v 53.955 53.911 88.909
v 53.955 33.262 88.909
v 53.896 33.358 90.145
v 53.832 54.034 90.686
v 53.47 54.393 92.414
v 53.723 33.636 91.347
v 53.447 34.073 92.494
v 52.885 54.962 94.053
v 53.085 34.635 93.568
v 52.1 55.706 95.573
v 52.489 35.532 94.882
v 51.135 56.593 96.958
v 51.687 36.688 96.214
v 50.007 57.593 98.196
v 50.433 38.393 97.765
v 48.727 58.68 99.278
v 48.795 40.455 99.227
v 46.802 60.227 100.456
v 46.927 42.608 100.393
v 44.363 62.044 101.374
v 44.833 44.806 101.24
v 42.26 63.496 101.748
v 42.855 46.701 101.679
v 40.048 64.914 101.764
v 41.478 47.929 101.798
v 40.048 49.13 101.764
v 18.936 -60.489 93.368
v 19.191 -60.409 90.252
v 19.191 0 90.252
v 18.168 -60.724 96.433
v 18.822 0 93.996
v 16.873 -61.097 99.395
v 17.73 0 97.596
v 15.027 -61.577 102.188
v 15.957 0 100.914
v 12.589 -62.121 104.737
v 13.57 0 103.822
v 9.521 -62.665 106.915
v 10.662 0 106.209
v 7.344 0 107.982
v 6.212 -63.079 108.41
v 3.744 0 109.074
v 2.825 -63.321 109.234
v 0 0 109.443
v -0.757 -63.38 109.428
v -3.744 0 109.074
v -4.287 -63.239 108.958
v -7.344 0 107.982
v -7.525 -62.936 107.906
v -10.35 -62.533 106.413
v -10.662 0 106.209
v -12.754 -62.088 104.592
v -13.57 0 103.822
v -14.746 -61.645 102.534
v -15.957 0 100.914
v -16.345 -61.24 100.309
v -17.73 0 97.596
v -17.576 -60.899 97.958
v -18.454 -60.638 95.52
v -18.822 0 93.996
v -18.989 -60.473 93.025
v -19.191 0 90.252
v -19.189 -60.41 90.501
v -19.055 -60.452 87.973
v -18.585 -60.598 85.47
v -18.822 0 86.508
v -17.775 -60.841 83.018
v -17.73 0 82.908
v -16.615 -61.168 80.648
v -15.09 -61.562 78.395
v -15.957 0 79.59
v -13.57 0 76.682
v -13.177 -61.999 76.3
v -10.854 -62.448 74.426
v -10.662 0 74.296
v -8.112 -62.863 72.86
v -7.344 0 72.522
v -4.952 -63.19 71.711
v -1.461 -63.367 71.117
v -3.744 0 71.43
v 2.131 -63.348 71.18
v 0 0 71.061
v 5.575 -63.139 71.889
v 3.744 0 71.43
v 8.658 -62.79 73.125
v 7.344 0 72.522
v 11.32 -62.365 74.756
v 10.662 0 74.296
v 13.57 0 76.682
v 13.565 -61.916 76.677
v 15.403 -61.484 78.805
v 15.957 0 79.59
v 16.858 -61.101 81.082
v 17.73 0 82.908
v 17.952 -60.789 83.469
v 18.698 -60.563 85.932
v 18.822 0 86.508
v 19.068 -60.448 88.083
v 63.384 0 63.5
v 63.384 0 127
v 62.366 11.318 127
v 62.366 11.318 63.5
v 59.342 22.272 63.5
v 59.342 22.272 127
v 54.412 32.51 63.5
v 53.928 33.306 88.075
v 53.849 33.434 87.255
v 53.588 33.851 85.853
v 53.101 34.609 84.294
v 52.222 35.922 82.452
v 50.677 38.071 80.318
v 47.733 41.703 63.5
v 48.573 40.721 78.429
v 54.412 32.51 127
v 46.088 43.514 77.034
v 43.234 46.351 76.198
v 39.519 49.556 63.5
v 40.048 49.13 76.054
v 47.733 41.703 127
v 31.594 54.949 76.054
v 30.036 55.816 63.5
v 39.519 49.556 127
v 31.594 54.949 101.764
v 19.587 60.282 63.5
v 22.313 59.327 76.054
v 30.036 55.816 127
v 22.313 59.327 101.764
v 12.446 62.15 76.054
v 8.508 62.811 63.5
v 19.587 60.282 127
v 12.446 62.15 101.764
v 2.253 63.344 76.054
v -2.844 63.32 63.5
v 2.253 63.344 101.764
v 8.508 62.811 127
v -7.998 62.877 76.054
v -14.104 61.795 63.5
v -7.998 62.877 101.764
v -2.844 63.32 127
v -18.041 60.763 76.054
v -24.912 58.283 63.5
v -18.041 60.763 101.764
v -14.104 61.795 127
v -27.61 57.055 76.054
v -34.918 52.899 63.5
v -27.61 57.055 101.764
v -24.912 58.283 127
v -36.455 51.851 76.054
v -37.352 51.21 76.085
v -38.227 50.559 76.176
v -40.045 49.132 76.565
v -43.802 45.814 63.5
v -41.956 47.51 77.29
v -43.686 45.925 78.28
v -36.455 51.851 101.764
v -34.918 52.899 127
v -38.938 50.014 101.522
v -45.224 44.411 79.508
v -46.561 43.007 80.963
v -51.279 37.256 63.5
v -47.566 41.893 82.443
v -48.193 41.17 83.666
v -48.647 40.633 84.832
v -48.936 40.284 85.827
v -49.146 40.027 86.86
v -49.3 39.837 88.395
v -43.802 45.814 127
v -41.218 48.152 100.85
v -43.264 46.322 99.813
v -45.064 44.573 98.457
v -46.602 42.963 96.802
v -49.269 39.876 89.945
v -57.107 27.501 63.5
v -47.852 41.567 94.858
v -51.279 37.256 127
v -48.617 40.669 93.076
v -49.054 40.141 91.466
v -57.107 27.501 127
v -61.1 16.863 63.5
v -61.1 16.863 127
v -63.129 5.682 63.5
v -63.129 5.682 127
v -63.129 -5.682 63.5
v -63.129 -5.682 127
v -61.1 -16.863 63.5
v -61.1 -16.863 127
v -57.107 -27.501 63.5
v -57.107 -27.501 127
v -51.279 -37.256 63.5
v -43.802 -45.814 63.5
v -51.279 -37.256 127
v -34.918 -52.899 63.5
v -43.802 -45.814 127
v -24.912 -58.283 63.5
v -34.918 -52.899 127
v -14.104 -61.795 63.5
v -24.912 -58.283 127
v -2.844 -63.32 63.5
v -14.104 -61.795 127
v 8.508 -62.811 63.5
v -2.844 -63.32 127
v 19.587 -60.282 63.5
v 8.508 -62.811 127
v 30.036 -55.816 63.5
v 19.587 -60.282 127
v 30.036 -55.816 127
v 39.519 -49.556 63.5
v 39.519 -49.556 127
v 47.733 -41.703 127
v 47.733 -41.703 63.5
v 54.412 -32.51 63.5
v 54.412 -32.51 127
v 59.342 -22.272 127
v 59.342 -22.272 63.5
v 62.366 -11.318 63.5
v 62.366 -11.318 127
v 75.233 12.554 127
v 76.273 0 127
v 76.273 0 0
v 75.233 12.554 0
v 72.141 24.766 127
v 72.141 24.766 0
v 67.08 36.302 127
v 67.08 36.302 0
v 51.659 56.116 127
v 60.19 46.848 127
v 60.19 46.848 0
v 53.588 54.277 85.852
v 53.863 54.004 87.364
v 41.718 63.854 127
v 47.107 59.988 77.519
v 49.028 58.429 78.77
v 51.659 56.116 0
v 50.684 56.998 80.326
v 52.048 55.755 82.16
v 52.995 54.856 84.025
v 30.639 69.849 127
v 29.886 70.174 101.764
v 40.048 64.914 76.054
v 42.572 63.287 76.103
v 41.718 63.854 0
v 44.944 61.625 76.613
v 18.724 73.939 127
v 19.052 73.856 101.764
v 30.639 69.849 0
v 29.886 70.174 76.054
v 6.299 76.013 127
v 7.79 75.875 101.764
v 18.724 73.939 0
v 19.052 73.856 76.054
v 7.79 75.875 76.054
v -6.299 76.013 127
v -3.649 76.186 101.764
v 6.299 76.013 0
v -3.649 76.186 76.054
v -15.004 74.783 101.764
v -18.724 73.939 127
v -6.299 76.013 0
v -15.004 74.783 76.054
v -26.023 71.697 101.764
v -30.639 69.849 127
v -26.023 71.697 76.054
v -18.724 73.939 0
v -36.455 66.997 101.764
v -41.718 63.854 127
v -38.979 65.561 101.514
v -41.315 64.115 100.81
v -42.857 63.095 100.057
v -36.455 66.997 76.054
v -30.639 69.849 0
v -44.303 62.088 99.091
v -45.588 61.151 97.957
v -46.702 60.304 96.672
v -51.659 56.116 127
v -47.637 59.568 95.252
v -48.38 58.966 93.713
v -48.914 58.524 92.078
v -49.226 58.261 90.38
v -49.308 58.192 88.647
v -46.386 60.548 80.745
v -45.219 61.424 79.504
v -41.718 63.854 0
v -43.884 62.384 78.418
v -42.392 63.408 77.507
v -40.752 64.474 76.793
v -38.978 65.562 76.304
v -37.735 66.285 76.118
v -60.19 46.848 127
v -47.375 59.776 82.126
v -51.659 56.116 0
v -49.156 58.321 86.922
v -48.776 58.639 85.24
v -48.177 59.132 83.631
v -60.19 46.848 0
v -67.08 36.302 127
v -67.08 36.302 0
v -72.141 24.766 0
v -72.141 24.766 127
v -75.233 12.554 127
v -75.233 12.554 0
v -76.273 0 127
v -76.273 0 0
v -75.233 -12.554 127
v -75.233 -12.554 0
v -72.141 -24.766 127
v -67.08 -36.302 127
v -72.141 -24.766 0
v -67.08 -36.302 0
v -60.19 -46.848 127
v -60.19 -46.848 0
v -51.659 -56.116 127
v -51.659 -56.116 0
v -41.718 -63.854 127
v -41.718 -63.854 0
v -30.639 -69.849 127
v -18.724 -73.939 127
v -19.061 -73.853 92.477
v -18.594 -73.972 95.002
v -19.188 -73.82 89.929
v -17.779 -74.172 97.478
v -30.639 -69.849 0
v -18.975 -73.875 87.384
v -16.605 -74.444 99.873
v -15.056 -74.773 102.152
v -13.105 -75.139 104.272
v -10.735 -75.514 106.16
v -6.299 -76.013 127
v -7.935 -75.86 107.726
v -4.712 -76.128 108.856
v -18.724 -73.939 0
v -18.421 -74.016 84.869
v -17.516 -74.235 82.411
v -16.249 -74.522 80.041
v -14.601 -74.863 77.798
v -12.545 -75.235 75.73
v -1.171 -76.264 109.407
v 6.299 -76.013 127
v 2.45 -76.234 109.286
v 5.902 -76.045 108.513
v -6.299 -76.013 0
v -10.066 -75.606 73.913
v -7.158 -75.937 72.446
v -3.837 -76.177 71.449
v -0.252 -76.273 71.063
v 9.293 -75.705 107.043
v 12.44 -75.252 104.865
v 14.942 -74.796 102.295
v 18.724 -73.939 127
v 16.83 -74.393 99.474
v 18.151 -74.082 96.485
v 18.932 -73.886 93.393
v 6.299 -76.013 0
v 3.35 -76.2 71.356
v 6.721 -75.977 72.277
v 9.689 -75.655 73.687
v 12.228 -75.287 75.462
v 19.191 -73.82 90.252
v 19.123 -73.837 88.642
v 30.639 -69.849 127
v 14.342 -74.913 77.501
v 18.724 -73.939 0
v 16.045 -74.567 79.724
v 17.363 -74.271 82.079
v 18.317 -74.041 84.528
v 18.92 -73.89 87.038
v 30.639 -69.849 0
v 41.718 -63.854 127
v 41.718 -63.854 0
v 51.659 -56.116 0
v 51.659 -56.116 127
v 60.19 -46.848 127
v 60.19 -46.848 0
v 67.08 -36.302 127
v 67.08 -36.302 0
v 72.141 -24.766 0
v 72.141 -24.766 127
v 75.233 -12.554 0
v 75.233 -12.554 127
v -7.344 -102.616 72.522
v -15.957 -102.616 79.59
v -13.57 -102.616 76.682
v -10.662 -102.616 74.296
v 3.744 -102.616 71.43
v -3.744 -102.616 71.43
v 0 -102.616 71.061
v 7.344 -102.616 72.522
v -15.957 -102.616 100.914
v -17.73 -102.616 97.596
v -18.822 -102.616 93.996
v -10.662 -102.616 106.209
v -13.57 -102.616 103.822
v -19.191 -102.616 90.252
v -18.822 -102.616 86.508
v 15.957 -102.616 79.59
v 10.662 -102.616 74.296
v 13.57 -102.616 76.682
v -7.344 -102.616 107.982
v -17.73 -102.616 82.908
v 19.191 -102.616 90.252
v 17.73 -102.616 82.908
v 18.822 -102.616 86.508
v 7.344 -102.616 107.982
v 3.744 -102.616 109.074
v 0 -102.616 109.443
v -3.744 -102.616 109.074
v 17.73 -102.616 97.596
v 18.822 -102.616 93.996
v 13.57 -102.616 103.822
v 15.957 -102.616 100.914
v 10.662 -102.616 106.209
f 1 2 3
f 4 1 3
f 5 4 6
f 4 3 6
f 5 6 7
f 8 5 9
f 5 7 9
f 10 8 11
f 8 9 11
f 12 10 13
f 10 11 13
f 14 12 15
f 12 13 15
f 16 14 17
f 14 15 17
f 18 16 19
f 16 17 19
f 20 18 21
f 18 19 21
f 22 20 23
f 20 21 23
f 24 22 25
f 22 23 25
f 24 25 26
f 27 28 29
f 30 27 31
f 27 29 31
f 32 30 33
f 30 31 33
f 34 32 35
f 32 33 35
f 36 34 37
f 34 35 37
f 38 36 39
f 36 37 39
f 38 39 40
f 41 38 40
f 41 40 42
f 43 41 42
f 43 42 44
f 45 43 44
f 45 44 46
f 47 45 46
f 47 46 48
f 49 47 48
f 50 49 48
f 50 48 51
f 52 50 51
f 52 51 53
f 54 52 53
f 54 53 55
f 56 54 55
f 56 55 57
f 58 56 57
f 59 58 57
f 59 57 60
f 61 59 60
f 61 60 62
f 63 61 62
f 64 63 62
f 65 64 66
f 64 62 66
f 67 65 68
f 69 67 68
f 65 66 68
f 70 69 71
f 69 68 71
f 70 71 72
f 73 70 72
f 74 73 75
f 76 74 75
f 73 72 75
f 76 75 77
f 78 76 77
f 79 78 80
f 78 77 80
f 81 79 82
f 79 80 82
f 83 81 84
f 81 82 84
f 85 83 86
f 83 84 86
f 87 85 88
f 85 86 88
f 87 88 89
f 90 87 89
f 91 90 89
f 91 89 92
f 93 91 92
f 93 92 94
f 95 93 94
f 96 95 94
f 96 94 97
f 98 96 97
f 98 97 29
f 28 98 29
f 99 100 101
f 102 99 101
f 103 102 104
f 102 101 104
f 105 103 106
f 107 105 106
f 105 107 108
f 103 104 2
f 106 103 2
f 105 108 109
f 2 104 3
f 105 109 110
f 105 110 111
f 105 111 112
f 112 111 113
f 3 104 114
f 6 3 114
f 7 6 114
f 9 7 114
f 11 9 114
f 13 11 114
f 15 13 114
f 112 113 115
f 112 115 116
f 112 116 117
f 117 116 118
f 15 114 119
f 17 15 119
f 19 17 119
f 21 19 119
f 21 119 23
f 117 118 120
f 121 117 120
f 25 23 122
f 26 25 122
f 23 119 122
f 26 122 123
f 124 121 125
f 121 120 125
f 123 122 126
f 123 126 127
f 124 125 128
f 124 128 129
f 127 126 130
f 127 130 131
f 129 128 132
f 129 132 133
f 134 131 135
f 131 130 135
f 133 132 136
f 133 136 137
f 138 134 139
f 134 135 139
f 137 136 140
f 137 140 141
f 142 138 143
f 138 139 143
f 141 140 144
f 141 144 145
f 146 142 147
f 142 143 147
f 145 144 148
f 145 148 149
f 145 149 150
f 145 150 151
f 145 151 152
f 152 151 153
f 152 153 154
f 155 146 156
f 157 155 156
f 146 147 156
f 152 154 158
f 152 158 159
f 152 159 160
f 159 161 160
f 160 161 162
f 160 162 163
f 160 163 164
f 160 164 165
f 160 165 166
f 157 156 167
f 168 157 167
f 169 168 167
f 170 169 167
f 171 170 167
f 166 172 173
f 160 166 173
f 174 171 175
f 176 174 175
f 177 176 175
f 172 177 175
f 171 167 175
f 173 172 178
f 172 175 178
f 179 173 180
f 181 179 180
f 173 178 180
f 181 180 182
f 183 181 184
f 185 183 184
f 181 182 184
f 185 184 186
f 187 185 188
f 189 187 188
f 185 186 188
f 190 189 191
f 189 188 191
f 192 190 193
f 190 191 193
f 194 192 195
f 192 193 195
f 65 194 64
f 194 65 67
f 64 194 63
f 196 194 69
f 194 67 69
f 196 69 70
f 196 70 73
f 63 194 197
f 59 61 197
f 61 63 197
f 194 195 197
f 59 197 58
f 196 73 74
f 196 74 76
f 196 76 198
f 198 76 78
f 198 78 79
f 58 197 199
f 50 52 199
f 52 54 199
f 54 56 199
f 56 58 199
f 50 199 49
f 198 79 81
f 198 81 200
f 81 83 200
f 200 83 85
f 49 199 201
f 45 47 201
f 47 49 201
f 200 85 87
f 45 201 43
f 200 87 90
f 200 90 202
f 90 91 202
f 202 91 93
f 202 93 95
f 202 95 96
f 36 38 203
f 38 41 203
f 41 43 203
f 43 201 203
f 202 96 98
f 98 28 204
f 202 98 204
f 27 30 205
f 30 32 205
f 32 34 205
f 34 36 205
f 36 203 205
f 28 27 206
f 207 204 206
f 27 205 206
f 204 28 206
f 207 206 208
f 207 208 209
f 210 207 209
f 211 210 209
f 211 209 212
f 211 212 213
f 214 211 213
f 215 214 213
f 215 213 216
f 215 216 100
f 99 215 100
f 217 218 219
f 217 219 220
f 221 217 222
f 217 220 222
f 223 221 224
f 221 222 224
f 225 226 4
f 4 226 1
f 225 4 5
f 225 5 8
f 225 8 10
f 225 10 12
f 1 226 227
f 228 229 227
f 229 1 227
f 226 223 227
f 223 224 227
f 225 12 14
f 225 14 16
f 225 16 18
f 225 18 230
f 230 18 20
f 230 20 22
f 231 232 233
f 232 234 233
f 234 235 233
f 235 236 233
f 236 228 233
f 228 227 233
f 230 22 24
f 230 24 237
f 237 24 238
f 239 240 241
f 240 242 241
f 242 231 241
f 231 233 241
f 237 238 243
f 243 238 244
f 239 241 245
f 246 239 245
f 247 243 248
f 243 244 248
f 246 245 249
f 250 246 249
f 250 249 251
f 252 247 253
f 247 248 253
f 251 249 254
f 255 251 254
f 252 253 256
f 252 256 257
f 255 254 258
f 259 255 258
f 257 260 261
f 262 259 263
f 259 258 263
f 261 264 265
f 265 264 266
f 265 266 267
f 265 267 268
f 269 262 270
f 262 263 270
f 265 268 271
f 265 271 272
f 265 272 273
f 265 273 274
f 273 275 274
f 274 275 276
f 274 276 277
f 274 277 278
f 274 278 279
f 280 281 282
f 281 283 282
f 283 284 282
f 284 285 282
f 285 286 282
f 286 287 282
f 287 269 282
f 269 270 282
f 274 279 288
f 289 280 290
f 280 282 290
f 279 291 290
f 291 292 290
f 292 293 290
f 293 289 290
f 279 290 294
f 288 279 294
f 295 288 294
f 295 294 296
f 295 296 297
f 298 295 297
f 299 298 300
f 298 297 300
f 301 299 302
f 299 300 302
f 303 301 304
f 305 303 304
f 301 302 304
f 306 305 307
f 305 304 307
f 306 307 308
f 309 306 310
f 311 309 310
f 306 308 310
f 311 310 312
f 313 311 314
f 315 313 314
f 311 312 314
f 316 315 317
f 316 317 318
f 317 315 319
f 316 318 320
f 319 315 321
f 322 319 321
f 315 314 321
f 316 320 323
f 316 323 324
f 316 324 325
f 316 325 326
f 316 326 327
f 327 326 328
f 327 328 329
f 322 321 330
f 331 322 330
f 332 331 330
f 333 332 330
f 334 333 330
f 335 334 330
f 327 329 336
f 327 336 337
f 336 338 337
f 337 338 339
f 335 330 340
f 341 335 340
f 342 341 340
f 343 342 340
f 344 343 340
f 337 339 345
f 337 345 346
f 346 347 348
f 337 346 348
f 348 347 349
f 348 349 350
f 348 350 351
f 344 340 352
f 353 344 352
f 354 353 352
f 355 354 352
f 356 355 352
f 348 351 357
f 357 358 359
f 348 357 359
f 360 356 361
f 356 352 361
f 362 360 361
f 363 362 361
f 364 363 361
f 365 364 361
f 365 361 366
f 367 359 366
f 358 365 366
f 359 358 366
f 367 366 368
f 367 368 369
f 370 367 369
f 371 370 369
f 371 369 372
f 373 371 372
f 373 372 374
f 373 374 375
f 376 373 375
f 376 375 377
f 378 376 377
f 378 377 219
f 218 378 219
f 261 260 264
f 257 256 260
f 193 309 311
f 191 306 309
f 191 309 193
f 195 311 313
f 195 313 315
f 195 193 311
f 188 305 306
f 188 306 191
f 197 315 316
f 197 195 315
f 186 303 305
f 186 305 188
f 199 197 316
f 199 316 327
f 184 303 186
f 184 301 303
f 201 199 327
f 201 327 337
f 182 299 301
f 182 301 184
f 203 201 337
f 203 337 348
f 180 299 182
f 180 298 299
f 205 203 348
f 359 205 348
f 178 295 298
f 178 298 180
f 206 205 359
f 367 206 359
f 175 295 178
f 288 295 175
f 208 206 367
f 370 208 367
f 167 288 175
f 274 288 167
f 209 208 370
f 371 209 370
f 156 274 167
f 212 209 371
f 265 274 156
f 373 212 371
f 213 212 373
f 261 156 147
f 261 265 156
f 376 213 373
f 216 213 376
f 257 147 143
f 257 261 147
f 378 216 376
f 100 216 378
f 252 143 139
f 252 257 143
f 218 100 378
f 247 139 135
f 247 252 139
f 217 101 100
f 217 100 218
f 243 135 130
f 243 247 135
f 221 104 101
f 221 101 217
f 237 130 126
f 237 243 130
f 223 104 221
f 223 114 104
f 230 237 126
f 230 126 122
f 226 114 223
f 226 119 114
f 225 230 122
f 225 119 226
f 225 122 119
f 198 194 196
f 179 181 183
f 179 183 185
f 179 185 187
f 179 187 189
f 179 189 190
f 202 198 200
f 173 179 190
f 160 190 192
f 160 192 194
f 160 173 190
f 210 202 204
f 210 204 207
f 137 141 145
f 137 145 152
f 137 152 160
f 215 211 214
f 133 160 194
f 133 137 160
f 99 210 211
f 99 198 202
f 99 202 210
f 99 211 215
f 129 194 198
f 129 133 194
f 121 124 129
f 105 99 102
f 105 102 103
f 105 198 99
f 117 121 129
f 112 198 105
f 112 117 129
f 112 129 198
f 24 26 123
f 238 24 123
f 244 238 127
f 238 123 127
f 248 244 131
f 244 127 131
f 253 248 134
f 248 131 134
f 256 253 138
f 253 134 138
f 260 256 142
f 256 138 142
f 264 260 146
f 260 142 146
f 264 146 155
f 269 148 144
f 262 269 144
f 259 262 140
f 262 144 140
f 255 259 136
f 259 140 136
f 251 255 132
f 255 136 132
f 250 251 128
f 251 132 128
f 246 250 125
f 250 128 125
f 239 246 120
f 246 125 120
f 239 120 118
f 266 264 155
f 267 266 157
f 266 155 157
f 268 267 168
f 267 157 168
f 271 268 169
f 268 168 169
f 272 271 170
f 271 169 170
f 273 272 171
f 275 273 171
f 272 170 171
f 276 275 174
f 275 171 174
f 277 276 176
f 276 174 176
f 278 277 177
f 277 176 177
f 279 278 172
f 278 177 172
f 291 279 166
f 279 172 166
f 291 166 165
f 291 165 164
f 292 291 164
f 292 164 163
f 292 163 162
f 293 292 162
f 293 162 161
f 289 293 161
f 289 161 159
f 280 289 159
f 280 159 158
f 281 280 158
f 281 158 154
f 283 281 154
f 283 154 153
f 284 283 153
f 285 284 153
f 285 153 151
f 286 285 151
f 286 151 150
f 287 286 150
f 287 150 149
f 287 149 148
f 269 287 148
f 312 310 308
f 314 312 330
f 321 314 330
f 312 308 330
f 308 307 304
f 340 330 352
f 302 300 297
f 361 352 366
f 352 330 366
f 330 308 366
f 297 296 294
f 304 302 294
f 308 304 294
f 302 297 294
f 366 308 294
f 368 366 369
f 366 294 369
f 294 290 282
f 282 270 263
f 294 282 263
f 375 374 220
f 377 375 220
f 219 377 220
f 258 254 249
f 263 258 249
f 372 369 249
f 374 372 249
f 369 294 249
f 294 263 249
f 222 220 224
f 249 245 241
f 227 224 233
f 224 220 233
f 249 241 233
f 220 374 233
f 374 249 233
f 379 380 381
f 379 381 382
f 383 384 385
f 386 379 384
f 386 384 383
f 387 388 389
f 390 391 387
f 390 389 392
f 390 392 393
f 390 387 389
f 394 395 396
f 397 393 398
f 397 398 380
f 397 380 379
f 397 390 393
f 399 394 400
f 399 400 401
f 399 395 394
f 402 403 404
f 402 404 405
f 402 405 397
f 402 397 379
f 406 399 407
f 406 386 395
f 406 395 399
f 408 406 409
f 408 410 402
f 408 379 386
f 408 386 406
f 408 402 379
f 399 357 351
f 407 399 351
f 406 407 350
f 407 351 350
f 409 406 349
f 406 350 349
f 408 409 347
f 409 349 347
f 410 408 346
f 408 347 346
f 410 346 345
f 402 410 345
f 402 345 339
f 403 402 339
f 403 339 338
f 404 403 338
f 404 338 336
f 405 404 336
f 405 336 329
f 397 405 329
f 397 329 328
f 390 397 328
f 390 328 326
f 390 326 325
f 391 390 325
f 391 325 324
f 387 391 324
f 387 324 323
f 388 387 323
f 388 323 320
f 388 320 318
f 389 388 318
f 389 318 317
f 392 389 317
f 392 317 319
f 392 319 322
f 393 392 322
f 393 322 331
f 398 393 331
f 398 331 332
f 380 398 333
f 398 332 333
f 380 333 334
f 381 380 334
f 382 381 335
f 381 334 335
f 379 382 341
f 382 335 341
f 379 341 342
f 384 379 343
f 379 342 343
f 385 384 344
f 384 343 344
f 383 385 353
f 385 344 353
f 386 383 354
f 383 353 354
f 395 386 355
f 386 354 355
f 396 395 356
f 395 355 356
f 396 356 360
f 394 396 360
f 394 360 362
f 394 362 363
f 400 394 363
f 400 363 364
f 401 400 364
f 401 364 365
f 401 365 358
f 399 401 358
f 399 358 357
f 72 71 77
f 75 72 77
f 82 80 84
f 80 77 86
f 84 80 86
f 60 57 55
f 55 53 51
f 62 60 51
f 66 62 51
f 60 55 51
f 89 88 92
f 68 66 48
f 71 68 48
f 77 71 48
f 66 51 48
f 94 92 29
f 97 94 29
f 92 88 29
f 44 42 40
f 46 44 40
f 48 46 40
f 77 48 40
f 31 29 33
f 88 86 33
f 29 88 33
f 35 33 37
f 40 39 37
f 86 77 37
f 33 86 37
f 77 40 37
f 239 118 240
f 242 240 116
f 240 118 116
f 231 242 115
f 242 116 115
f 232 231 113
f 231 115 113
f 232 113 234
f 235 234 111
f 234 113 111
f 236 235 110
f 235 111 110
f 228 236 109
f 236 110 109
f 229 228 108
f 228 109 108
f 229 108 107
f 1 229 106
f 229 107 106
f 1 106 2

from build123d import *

# Parameters (mm, degrees)
F0_R     = 76.2734110289
F1_DEPTH = 127
F2_R     = 63.3841593345
F3_DEPTH = 63.5
F5_DEPTH = 127
F6_R     = 19.1908924799
F7_DEPTH = 102.616


with BuildPart() as f1:
    # F0 (on Top) → F1 (new body)
    with BuildSketch(Plane.XY):
        Circle(F0_R)
    extrude(amount=F1_DEPTH)

    # F2 (on face) → F3 (cut)
    with BuildSketch(Plane.XY.offset(127)):
        Circle(F2_R)
    extrude(amount=-F3_DEPTH, mode=Mode.SUBTRACT)

    # F4 (on Front) → F5 (cut)
    with BuildSketch(Plane.XZ):
        with BuildLine():
            ThreePointArc((-23.6000716686, 88.9091379941), (-27.3653091558, 79.819050587), (-36.4553965628, 76.0538130999))
            Line((-36.4553965628, 76.0538130999), (40.0476576165, 76.0538130999))
            ThreePointArc((40.0476576165, 76.0538130999), (28.1651377987, 88.9091379941), (40.0476576165, 101.7644628882))
            Line((40.0476576165, 101.7644628882), (-36.4553965628, 101.7644628882))
            ThreePointArc((-36.4553965628, 101.7644628882), (-27.3653091558, 97.9992254011), (-23.6000716686, 88.9091379941))
        make_face()
        with BuildLine():
            ThreePointArc((-36.4553965628, 101.7644628882), (-49.310721457, 88.9091379941), (-36.4553965628, 76.0538130999))
            Line((-36.4553965628, 76.0538130999), (-36.4553965628, 101.7644628882))
        make_face()
        with BuildLine():
            Line((-36.4553965628, 101.7644628882), (-36.4553965628, 76.0538130999))
            ThreePointArc((-36.4553965628, 76.0538130999), (-27.3653091558, 79.819050587), (-23.6000716686, 88.9091379941))
            ThreePointArc((-23.6000716686, 88.9091379941), (-27.3653091558, 97.9992254011), (-36.4553965628, 101.7644628882))
        make_face()
        with BuildLine():
            ThreePointArc((40.0476576165, 101.7644628882), (28.1651377987, 88.9091379941), (40.0476576165, 76.0538130999))
            Line((40.0476576165, 76.0538130999), (41.0602837801, 76.0538130999))
            Line((41.0602837801, 76.0538130999), (41.0602837801, 101.7644628882))
            Line((41.0602837801, 101.7644628882), (40.0476576165, 101.7644628882))
        make_face()
        with BuildLine():
            Line((41.0602837801, 76.0538130999), (40.0476576165, 76.0538130999))
            ThreePointArc((40.0476576165, 76.0538130999), (49.8131926588, 79.4396408562), (53.9554297615, 88.9091379941))
            ThreePointArc((53.9554297615, 88.9091379941), (49.8131926588, 98.3786351319), (40.0476576165, 101.7644628882))
            Line((40.0476576165, 101.7644628882), (41.0602837801, 101.7644628882))
            Line((41.0602837801, 101.7644628882), (41.0602837801, 76.0538130999))
        make_face()
    extrude(amount=-F5_DEPTH, mode=Mode.SUBTRACT)

    # F6 (on Front) → F7 (join)
    with BuildSketch(Plane.XZ):
        with Locations((0, 90.2522355318)):
            Circle(F6_R)
    extrude(amount=F7_DEPTH)


solid = f1.part
